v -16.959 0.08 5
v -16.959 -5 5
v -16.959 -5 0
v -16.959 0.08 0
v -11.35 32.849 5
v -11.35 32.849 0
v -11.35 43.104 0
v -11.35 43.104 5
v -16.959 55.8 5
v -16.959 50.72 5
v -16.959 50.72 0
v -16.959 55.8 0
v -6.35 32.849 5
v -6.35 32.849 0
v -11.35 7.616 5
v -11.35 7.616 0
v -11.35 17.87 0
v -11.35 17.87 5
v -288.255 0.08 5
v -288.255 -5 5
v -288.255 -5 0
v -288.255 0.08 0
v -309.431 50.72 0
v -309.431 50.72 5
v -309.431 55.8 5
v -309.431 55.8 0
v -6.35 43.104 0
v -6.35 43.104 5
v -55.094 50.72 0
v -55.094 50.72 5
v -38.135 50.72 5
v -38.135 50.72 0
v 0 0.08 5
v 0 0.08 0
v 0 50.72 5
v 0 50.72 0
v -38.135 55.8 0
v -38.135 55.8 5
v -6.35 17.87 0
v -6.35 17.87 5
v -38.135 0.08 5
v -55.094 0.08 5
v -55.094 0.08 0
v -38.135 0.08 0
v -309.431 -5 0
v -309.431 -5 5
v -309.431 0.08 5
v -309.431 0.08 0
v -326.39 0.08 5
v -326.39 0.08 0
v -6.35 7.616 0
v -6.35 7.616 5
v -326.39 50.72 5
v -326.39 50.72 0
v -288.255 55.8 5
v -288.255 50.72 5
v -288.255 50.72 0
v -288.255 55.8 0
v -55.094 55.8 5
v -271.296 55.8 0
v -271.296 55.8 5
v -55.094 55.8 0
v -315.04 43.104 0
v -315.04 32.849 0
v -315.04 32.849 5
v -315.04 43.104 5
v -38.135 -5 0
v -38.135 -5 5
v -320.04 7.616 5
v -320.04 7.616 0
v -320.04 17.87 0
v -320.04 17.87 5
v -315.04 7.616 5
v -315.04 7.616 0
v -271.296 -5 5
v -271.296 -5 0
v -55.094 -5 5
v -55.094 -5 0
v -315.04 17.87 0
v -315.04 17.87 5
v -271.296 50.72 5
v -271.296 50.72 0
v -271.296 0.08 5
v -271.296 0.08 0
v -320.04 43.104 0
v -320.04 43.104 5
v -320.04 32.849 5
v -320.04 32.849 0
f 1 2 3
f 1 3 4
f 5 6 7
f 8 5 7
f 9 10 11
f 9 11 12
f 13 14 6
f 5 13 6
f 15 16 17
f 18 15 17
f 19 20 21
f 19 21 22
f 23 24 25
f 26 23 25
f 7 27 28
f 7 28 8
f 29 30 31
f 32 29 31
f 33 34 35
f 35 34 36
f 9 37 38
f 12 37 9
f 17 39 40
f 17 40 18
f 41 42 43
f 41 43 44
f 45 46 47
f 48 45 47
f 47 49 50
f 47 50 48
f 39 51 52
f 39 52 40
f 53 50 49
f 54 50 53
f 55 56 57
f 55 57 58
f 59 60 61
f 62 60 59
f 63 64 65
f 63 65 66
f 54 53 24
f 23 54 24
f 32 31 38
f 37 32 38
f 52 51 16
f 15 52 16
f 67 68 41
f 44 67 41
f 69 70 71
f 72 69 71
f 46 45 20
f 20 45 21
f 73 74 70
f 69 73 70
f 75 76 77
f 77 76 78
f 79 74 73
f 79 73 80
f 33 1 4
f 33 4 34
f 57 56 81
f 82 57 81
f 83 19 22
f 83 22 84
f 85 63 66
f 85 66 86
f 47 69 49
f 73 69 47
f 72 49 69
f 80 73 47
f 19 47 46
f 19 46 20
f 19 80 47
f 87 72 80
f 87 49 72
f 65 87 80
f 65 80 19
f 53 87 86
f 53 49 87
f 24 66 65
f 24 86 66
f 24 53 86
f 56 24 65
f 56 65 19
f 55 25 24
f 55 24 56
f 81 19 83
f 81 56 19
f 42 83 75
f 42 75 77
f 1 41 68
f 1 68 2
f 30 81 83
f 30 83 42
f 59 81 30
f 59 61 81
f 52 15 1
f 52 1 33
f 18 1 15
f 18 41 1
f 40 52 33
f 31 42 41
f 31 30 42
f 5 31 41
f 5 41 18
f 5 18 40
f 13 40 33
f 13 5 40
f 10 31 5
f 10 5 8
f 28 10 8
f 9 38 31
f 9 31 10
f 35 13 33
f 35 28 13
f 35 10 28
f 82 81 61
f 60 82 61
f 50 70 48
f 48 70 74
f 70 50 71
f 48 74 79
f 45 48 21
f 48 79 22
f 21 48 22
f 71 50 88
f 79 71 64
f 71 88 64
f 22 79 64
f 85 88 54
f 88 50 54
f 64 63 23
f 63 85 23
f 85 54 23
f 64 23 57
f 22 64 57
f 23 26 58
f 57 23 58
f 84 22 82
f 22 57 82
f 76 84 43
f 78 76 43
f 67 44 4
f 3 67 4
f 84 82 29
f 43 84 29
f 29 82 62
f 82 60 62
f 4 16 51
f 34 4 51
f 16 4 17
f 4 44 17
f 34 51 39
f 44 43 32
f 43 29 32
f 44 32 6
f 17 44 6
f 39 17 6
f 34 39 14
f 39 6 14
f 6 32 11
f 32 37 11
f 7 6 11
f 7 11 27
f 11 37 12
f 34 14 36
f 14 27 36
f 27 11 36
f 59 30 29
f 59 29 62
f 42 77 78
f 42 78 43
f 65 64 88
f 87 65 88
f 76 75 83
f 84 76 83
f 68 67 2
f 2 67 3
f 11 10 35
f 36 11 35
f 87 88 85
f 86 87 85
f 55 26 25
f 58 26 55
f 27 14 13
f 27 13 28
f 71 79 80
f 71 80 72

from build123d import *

# Parameters (mm, degrees)
SKETCH1_W           = 326.39
SKETCH1_H           = 60.799999812
BOSS_EXTRUDE1_DEPTH = 5
SKETCH9_W           = 16.959219297
SKETCH9_H           = 5.08
CUT_EXTRUDE2_DEPTH  = 5.08
CUT_EXTRUDE3_REACH  = 333.163
SKETCH11_W          = 5
SKETCH11_H          = 10.254787301


with BuildPart() as part:
    # Sketch1 → Boss-Extrude1 (new body)
    with BuildSketch(Plane.XY):
        with Locations((-163.195, 25.4)):
            Rectangle(SKETCH1_W, SKETCH1_H)
    extrude(amount=BOSS_EXTRUDE1_DEPTH)

    # Sketch9 → Cut-Extrude2 (cut)
    with BuildSketch(Plane.XY.offset(4.999999906)):
        with Locations((-46.614250443, -2.459999906)):
            Rectangle(SKETCH9_W, SKETCH9_H)
        with Locations((-8.479609649, -2.459999906)):
            Rectangle(SKETCH9_W, SKETCH9_H)
        with Locations((-8.479609649, 53.259999906)):
            Rectangle(SKETCH9_W, SKETCH9_H)
        with Locations((-46.614250443, 53.259999906)):
            Rectangle(SKETCH9_W, SKETCH9_H)
        with Locations((-279.775749558, 53.259999906)):
            Rectangle(SKETCH9_W, SKETCH9_H)
        with Locations((-317.910390352, 53.259999906)):
            Rectangle(SKETCH9_W, SKETCH9_H)
        with Locations((-317.910390352, -2.459999906)):
            Rectangle(SKETCH9_W, SKETCH9_H)
        with Locations((-279.775749558, -2.459999906)):
            Rectangle(SKETCH9_W, SKETCH9_H)
    extrude(amount=-CUT_EXTRUDE2_DEPTH, mode=Mode.SUBTRACT)

    # Sketch11 → Cut-Extrude3 (cut, up to next)
    with BuildSketch(Plane(origin=(0, 0, 0), x_dir=(-1, 0, 0), z_dir=(0, 0, -1)), mode=Mode.PRIVATE) as cut_extrude3_sk1:
        with Locations((8.85, 37.976893645)):
            Rectangle(SKETCH11_W, SKETCH11_H)
    cut_extrude3_tool1 = extrude(cut_extrude3_sk1.sketch, amount=-CUT_EXTRUDE3_REACH, mode=Mode.PRIVATE) & part.part
    # Sketch11 → Cut-Extrude3 (cut, up to next)
    with BuildSketch(Plane(origin=(0, 0, 0), x_dir=(-1, 0, 0), z_dir=(0, 0, -1)), mode=Mode.PRIVATE) as cut_extrude3_sk2:
        with Locations((8.85, 12.743106261)):
            Rectangle(SKETCH11_W, SKETCH11_H)
    cut_extrude3_tool2 = extrude(cut_extrude3_sk2.sketch, amount=-CUT_EXTRUDE3_REACH, mode=Mode.PRIVATE) & part.part
    # Sketch11 → Cut-Extrude3 (cut, up to next)
    with BuildSketch(Plane(origin=(0, 0, 0), x_dir=(-1, 0, 0), z_dir=(0, 0, -1)), mode=Mode.PRIVATE) as cut_extrude3_sk3:
        with Locations((317.54, 12.743106261)):
            Rectangle(SKETCH11_W, SKETCH11_H)
    cut_extrude3_tool3 = extrude(cut_extrude3_sk3.sketch, amount=-CUT_EXTRUDE3_REACH, mode=Mode.PRIVATE) & part.part
    # Sketch11 → Cut-Extrude3 (cut, up to next)
    with BuildSketch(Plane(origin=(0, 0, 0), x_dir=(-1, 0, 0), z_dir=(0, 0, -1)), mode=Mode.PRIVATE) as cut_extrude3_sk4:
        with Locations((317.54, 37.976893645)):
            Rectangle(SKETCH11_W, SKETCH11_H)
    cut_extrude3_tool4 = extrude(cut_extrude3_sk4.sketch, amount=-CUT_EXTRUDE3_REACH, mode=Mode.PRIVATE) & part.part
    add(cut_extrude3_tool1.solids().sort_by_distance((-8.85, 37.976894, 0))[0], mode=Mode.SUBTRACT)
    add(cut_extrude3_tool2.solids().sort_by_distance((-8.85, 12.743106, 0))[0], mode=Mode.SUBTRACT)
    add(cut_extrude3_tool3.solids().sort_by_distance((-317.54, 12.743106, 0))[0], mode=Mode.SUBTRACT)
    add(cut_extrude3_tool4.solids().sort_by_distance((-317.54, 37.976894, 0))[0], mode=Mode.SUBTRACT)


solid = part.part
